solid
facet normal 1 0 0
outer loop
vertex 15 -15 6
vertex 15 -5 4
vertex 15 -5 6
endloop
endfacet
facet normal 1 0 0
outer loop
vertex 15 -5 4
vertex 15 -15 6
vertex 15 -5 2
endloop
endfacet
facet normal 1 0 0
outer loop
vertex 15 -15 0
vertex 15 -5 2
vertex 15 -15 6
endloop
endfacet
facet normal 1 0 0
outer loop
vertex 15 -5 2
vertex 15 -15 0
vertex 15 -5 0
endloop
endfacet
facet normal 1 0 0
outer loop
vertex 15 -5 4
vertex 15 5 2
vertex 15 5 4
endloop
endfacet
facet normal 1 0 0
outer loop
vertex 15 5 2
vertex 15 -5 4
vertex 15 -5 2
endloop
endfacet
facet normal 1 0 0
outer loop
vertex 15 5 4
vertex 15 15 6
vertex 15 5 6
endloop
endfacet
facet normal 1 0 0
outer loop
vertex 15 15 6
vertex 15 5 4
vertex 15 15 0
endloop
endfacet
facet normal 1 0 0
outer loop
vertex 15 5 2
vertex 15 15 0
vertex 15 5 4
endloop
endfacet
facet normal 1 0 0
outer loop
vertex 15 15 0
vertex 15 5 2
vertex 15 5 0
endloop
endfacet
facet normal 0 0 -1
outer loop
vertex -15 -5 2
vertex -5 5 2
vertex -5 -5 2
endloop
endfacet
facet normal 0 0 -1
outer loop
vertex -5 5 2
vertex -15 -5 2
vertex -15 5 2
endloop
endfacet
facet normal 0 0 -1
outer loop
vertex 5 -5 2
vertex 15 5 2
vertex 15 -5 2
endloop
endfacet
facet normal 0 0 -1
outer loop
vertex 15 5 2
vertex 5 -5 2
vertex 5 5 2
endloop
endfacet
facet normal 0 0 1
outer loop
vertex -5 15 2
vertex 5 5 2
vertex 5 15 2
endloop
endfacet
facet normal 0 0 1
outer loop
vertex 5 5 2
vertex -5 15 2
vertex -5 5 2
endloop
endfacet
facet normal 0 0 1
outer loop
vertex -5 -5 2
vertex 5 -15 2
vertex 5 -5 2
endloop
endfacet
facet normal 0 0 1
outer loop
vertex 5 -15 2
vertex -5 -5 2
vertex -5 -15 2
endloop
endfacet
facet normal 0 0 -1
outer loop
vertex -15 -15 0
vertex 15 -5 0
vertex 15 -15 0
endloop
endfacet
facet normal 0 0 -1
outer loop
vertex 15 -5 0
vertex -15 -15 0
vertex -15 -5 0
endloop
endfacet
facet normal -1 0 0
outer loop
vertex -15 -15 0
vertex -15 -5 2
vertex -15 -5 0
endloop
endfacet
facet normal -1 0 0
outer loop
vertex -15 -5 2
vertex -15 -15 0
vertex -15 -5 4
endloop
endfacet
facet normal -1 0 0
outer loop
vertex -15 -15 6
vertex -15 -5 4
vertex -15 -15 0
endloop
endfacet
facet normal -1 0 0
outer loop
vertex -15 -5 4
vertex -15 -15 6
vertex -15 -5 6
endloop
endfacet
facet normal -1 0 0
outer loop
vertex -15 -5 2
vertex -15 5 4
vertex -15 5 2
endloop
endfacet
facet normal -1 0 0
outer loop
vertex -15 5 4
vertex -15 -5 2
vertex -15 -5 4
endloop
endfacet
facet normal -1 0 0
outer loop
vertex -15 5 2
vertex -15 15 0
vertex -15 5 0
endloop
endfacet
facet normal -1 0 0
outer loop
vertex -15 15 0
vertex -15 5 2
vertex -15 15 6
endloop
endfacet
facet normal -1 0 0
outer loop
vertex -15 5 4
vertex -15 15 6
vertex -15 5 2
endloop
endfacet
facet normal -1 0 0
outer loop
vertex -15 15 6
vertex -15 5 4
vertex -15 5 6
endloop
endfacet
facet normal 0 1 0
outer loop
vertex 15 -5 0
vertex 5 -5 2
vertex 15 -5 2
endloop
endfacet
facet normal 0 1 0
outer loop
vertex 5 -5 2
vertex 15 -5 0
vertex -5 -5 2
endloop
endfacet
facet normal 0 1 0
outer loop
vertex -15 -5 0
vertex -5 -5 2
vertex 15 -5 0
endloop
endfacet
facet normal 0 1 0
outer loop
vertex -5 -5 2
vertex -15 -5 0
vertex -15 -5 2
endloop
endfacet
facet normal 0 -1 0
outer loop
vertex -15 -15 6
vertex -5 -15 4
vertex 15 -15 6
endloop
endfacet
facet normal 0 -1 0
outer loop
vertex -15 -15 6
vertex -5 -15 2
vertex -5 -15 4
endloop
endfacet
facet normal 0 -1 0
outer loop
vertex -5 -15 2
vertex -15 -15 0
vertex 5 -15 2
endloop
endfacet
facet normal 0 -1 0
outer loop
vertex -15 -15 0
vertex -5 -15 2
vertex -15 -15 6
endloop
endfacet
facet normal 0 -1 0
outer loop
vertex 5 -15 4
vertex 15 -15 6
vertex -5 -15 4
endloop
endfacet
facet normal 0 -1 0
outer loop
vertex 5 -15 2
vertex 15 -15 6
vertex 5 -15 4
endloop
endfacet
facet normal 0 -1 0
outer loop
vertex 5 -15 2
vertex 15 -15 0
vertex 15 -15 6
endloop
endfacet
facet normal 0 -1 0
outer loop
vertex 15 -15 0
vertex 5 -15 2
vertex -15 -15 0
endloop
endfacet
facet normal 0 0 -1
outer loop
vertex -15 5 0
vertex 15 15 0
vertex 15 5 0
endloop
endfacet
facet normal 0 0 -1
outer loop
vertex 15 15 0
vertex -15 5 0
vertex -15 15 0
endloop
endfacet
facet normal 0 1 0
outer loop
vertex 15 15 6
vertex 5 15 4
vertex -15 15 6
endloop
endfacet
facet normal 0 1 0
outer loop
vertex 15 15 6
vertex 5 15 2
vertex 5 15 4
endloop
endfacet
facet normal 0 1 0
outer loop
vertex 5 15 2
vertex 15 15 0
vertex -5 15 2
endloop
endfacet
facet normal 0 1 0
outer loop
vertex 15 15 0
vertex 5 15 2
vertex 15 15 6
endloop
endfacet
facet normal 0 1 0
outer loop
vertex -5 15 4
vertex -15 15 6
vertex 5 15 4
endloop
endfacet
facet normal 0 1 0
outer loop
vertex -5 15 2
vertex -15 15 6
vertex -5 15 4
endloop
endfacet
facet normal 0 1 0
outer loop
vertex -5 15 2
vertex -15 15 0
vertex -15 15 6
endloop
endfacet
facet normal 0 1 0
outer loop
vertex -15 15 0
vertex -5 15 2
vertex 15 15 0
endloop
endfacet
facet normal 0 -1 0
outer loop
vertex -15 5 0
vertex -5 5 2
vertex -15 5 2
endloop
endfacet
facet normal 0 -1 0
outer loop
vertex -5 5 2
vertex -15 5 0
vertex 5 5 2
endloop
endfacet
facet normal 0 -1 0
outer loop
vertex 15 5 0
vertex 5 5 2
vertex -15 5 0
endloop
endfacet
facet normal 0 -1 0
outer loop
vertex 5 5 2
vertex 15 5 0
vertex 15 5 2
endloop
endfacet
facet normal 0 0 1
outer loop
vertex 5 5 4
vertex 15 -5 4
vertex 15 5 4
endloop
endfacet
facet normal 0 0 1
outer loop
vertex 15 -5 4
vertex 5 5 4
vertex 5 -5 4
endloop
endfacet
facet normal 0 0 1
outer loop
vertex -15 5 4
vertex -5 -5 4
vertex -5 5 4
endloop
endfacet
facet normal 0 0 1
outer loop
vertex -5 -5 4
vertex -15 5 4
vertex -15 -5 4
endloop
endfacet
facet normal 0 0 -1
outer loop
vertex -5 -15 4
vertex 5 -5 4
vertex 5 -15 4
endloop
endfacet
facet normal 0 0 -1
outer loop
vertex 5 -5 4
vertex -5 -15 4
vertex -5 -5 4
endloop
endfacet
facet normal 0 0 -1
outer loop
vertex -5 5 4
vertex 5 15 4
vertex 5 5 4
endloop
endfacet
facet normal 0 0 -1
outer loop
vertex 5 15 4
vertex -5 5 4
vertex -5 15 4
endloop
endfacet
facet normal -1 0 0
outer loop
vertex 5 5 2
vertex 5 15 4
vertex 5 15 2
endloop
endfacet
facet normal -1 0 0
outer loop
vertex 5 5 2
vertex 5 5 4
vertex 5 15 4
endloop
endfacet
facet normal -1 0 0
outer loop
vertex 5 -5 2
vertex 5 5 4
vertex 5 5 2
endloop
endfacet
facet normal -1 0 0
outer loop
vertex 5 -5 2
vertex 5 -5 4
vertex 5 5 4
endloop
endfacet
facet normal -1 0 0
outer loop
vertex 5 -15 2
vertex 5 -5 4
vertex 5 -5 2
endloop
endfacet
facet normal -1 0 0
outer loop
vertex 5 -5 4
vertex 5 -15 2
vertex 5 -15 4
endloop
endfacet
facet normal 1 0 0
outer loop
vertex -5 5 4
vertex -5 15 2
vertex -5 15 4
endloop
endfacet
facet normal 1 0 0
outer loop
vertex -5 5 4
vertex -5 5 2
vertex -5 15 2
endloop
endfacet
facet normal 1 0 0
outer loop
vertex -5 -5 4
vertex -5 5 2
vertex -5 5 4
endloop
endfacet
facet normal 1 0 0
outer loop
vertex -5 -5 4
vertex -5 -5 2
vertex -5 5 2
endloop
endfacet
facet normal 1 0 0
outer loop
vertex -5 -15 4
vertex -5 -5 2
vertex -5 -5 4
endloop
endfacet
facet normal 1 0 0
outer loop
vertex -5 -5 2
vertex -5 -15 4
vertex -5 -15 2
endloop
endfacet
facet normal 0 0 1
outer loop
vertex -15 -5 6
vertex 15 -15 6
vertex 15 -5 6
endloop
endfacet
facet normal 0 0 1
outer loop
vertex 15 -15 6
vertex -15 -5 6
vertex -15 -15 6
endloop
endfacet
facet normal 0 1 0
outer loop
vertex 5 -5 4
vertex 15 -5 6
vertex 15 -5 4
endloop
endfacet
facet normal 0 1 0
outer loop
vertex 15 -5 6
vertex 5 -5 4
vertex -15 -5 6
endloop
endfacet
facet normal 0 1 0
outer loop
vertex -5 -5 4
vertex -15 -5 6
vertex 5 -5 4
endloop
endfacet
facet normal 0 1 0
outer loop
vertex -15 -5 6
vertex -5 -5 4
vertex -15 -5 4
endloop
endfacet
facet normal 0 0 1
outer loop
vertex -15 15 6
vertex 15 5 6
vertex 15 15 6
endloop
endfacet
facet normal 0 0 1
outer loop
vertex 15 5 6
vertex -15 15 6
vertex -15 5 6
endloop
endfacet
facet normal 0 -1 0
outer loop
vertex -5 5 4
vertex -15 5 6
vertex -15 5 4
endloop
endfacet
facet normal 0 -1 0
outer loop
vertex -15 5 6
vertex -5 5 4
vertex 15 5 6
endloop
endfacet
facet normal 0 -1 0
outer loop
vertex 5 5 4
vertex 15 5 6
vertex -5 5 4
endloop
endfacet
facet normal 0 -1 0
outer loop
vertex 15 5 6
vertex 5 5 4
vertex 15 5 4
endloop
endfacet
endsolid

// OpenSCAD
//dual extruder test
yellow = 1;
blue = 0;

layer(0);
rotate([0,0,90])
layer(2);
rotate([0,0,0])
layer(4);



module layer(z = 0)
{
    translate([-15,-15,z])
    {
        if (yellow==1)
        {
            color ("yellow") 
            {
                cube([30,10,2]);
                translate([0,20,0])
                    cube([30,10,2]);
            }
        }
        
        if (blue == 1)
        {
            color ("blue") 
            {	
                translate([0,10,0])
                    cube([30,10,2]);
            }
        }
    }
}
